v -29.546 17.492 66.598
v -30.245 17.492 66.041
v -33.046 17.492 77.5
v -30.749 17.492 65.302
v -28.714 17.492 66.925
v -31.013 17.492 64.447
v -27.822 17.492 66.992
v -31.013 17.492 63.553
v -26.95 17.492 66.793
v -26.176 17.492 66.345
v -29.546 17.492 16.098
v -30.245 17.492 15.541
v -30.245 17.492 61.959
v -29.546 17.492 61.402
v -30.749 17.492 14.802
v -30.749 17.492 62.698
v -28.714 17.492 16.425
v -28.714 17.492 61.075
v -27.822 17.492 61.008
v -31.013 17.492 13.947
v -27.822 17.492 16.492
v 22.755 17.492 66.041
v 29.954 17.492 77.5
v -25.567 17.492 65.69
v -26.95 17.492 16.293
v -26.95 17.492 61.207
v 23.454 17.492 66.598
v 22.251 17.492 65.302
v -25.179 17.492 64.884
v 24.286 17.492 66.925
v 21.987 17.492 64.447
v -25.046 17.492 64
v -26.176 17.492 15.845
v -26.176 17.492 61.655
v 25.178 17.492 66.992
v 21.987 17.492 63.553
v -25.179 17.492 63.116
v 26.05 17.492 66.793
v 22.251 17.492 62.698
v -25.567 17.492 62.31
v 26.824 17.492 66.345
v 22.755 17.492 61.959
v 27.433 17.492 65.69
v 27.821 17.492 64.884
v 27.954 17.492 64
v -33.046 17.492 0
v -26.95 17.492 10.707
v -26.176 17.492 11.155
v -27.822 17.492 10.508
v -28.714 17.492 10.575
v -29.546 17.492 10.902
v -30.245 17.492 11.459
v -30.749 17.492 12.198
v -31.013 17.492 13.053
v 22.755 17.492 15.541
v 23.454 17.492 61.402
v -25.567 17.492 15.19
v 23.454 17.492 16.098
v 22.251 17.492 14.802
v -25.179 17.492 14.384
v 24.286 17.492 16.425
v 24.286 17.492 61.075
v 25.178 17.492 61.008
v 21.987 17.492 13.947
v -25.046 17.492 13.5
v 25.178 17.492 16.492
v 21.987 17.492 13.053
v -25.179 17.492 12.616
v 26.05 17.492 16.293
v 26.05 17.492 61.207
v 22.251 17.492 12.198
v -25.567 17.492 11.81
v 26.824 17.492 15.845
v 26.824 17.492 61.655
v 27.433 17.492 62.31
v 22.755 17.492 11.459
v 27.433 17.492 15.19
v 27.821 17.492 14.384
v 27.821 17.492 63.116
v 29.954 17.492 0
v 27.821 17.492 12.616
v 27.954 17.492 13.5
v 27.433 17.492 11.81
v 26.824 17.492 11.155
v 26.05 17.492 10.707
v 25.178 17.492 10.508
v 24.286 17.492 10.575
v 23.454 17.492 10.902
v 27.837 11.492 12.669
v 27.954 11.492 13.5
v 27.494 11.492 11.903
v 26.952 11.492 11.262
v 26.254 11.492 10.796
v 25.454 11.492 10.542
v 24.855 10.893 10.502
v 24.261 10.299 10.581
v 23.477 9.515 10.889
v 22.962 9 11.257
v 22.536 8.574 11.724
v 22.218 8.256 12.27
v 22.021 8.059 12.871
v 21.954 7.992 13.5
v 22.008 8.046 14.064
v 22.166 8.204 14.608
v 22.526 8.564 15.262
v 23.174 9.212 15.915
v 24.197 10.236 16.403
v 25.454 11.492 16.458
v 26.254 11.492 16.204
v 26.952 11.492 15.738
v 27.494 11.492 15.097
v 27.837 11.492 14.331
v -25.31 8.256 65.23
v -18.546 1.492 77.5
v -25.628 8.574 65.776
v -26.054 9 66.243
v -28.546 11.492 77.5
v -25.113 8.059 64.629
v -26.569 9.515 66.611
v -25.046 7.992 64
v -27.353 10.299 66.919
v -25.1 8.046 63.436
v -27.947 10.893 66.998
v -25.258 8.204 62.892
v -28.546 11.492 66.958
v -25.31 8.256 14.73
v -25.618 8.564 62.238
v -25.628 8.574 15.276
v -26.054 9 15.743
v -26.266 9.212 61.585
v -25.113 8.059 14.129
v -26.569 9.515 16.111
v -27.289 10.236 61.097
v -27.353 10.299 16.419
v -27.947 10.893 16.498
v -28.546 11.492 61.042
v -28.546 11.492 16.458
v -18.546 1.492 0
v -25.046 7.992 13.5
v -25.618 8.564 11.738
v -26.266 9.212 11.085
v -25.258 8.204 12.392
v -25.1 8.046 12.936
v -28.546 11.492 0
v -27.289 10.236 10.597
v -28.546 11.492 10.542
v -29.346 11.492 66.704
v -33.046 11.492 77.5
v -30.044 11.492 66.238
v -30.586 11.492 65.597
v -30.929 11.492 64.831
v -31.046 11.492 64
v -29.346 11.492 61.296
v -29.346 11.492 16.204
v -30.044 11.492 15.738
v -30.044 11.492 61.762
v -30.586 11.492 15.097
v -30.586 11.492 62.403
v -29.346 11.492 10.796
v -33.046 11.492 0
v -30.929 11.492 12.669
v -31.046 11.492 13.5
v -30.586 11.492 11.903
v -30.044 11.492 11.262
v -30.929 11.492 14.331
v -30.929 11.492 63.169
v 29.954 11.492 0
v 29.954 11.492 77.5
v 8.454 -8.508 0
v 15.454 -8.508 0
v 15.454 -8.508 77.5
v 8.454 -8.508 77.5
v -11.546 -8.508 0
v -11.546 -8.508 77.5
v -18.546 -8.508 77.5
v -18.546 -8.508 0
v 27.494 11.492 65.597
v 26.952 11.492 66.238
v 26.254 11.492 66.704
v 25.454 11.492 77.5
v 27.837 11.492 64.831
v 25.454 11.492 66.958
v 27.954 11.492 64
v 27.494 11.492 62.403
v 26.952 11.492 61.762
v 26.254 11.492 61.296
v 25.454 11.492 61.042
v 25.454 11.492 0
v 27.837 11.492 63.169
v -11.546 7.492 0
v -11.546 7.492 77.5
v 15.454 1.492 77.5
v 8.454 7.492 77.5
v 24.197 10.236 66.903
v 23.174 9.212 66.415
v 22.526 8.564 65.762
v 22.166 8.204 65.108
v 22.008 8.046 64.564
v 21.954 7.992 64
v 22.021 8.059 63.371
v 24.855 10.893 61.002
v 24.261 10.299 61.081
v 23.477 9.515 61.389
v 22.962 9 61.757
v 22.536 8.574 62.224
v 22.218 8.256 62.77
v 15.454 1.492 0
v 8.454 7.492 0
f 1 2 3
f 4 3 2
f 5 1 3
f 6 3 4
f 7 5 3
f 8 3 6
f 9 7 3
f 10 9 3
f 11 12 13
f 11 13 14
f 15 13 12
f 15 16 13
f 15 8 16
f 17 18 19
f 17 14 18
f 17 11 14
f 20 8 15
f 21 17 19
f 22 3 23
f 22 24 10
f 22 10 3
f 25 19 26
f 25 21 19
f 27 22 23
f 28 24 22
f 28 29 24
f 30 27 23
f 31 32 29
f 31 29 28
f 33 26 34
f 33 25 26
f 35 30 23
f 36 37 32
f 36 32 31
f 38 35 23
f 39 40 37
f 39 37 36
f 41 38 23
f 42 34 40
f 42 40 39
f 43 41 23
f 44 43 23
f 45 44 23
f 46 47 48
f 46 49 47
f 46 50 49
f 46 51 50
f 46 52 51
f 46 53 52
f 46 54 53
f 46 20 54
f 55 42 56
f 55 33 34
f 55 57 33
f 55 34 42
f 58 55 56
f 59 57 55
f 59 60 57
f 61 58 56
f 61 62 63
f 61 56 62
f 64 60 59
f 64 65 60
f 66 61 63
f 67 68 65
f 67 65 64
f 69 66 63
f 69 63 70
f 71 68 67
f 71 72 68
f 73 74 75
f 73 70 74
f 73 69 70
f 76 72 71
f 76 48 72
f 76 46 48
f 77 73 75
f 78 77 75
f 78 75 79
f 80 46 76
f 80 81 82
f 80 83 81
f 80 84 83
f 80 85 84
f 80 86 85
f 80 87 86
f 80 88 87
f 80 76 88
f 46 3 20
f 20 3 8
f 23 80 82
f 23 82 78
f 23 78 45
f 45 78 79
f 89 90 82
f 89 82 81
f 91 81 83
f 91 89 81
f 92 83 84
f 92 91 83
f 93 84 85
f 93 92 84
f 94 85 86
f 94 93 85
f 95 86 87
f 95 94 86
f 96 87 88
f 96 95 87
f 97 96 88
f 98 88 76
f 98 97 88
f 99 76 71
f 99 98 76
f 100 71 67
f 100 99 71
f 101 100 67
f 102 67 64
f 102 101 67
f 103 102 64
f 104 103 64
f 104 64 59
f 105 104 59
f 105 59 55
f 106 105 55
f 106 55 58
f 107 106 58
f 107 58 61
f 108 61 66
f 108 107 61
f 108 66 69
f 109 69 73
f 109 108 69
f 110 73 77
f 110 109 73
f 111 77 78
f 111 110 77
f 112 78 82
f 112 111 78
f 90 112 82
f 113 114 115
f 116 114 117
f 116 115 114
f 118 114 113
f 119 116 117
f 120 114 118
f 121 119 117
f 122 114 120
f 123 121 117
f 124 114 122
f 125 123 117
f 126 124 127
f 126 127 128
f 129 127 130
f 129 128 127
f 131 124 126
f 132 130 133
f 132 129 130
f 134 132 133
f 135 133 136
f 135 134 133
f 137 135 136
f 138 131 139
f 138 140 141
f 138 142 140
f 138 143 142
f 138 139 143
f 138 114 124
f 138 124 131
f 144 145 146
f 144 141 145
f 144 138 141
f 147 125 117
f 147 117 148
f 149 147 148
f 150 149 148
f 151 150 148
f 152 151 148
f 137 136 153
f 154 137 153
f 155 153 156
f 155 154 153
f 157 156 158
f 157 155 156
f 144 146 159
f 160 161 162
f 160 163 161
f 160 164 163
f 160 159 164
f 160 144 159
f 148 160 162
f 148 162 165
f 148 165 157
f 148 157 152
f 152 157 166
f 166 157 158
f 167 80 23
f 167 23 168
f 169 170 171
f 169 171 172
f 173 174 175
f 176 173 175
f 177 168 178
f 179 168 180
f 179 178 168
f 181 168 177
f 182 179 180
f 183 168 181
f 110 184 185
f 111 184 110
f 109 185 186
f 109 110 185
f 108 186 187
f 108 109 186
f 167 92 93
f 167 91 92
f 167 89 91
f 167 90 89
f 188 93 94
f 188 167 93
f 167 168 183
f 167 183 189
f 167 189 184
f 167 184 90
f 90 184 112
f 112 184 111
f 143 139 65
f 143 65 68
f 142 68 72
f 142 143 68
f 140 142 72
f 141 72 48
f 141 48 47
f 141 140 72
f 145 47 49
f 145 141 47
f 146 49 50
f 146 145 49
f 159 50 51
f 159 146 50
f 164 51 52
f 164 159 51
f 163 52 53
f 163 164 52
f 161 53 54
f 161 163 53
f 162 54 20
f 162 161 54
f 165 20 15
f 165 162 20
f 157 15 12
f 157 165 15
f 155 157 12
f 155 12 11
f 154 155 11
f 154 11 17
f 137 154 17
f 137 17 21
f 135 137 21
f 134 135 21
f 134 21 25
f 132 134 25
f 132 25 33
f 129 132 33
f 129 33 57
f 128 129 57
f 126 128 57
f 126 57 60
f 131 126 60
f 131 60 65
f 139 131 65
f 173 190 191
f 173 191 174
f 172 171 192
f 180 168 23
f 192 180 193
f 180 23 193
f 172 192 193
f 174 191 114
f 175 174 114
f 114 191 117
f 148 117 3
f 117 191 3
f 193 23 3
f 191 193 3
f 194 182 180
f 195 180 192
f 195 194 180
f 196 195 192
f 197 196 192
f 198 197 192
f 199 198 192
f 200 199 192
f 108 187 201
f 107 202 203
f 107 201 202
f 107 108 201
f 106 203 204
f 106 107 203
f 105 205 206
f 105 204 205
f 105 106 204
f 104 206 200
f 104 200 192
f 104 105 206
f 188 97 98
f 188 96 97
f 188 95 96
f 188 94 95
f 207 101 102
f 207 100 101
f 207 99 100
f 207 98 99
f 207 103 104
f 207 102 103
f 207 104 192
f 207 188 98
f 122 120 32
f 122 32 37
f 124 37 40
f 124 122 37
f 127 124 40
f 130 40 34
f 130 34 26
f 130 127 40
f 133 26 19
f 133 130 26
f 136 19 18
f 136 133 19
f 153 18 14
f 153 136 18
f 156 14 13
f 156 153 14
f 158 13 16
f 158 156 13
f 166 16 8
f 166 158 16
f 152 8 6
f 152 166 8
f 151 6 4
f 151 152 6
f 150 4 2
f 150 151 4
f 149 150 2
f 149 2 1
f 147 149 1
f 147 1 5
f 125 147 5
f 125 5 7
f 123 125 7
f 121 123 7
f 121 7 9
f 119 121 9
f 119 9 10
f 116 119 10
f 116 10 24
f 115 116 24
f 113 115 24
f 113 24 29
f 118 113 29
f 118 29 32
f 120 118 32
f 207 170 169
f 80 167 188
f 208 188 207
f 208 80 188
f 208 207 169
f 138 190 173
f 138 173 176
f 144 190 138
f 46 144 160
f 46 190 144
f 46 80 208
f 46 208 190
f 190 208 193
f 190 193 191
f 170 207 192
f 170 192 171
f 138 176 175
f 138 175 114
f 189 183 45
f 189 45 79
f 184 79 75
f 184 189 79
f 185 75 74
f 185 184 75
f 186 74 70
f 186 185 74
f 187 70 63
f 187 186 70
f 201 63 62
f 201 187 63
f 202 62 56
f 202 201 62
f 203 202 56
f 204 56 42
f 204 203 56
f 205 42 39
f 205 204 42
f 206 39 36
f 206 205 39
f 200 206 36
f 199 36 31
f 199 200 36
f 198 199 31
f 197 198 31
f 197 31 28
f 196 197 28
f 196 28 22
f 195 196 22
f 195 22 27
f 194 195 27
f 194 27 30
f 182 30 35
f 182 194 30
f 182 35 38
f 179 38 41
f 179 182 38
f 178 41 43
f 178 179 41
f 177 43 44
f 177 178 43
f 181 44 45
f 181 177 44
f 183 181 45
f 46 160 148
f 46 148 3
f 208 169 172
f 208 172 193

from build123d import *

# Parameters (mm, degrees)
Y_KSEKLIK_EKSTR_ZYON1_DEPTH = 77.5
KES_EKSTR_ZYON1_START       = 7.992125884
KES_EKSTR_ZYON1_OUTLINE_R   = 3
KES_EKSTR_ZYON1_DEPTH       = 9.5000001


# Read off the part's stored shape, not the designer's step: Kes-Ekstrüzyon1
with BuildPart() as part:
    # Çizim1 → Yükseklik-Ekstrüzyon1 (new body)
    with BuildSketch(Plane.XY):
        Polygon((-33.046021585, 17.492125984), (29.953978415, 17.492125984), (29.953978415, 11.492125984), (25.453978415, 11.492125984), (15.453978415, 1.492125984), (15.453978415, -8.507874016), (8.453978415, -8.507874016), (8.453978415, 7.492125984), (-11.546021585, 7.492125984), (-11.546021585, -8.507874016), (-18.546021585, -8.507874016), (-18.546021585, 1.492125984), (-28.546021585, 11.492125984), (-33.046021585, 11.492125984), align=None)
    extrude(amount=Y_KSEKLIK_EKSTR_ZYON1_DEPTH)

    # Kes-Ekstrüzyon1 outline → Kes-Ekstrüzyon1 (cut)
    with BuildSketch(Plane(origin=(0, 0, 0), x_dir=(1, 0, 0), z_dir=(0, 1, 0)).offset(KES_EKSTR_ZYON1_START)):
        with Locations((-28.046021585, -13.5)):
            Circle(KES_EKSTR_ZYON1_OUTLINE_R)
        with Locations((24.953978415, -64)):
            Circle(KES_EKSTR_ZYON1_OUTLINE_R)
        with Locations((-28.046021585, -64)):
            Circle(KES_EKSTR_ZYON1_OUTLINE_R)
        with Locations((24.953978415, -13.5)):
            Circle(KES_EKSTR_ZYON1_OUTLINE_R)
    extrude(amount=KES_EKSTR_ZYON1_DEPTH, mode=Mode.SUBTRACT)


solid = part.part
